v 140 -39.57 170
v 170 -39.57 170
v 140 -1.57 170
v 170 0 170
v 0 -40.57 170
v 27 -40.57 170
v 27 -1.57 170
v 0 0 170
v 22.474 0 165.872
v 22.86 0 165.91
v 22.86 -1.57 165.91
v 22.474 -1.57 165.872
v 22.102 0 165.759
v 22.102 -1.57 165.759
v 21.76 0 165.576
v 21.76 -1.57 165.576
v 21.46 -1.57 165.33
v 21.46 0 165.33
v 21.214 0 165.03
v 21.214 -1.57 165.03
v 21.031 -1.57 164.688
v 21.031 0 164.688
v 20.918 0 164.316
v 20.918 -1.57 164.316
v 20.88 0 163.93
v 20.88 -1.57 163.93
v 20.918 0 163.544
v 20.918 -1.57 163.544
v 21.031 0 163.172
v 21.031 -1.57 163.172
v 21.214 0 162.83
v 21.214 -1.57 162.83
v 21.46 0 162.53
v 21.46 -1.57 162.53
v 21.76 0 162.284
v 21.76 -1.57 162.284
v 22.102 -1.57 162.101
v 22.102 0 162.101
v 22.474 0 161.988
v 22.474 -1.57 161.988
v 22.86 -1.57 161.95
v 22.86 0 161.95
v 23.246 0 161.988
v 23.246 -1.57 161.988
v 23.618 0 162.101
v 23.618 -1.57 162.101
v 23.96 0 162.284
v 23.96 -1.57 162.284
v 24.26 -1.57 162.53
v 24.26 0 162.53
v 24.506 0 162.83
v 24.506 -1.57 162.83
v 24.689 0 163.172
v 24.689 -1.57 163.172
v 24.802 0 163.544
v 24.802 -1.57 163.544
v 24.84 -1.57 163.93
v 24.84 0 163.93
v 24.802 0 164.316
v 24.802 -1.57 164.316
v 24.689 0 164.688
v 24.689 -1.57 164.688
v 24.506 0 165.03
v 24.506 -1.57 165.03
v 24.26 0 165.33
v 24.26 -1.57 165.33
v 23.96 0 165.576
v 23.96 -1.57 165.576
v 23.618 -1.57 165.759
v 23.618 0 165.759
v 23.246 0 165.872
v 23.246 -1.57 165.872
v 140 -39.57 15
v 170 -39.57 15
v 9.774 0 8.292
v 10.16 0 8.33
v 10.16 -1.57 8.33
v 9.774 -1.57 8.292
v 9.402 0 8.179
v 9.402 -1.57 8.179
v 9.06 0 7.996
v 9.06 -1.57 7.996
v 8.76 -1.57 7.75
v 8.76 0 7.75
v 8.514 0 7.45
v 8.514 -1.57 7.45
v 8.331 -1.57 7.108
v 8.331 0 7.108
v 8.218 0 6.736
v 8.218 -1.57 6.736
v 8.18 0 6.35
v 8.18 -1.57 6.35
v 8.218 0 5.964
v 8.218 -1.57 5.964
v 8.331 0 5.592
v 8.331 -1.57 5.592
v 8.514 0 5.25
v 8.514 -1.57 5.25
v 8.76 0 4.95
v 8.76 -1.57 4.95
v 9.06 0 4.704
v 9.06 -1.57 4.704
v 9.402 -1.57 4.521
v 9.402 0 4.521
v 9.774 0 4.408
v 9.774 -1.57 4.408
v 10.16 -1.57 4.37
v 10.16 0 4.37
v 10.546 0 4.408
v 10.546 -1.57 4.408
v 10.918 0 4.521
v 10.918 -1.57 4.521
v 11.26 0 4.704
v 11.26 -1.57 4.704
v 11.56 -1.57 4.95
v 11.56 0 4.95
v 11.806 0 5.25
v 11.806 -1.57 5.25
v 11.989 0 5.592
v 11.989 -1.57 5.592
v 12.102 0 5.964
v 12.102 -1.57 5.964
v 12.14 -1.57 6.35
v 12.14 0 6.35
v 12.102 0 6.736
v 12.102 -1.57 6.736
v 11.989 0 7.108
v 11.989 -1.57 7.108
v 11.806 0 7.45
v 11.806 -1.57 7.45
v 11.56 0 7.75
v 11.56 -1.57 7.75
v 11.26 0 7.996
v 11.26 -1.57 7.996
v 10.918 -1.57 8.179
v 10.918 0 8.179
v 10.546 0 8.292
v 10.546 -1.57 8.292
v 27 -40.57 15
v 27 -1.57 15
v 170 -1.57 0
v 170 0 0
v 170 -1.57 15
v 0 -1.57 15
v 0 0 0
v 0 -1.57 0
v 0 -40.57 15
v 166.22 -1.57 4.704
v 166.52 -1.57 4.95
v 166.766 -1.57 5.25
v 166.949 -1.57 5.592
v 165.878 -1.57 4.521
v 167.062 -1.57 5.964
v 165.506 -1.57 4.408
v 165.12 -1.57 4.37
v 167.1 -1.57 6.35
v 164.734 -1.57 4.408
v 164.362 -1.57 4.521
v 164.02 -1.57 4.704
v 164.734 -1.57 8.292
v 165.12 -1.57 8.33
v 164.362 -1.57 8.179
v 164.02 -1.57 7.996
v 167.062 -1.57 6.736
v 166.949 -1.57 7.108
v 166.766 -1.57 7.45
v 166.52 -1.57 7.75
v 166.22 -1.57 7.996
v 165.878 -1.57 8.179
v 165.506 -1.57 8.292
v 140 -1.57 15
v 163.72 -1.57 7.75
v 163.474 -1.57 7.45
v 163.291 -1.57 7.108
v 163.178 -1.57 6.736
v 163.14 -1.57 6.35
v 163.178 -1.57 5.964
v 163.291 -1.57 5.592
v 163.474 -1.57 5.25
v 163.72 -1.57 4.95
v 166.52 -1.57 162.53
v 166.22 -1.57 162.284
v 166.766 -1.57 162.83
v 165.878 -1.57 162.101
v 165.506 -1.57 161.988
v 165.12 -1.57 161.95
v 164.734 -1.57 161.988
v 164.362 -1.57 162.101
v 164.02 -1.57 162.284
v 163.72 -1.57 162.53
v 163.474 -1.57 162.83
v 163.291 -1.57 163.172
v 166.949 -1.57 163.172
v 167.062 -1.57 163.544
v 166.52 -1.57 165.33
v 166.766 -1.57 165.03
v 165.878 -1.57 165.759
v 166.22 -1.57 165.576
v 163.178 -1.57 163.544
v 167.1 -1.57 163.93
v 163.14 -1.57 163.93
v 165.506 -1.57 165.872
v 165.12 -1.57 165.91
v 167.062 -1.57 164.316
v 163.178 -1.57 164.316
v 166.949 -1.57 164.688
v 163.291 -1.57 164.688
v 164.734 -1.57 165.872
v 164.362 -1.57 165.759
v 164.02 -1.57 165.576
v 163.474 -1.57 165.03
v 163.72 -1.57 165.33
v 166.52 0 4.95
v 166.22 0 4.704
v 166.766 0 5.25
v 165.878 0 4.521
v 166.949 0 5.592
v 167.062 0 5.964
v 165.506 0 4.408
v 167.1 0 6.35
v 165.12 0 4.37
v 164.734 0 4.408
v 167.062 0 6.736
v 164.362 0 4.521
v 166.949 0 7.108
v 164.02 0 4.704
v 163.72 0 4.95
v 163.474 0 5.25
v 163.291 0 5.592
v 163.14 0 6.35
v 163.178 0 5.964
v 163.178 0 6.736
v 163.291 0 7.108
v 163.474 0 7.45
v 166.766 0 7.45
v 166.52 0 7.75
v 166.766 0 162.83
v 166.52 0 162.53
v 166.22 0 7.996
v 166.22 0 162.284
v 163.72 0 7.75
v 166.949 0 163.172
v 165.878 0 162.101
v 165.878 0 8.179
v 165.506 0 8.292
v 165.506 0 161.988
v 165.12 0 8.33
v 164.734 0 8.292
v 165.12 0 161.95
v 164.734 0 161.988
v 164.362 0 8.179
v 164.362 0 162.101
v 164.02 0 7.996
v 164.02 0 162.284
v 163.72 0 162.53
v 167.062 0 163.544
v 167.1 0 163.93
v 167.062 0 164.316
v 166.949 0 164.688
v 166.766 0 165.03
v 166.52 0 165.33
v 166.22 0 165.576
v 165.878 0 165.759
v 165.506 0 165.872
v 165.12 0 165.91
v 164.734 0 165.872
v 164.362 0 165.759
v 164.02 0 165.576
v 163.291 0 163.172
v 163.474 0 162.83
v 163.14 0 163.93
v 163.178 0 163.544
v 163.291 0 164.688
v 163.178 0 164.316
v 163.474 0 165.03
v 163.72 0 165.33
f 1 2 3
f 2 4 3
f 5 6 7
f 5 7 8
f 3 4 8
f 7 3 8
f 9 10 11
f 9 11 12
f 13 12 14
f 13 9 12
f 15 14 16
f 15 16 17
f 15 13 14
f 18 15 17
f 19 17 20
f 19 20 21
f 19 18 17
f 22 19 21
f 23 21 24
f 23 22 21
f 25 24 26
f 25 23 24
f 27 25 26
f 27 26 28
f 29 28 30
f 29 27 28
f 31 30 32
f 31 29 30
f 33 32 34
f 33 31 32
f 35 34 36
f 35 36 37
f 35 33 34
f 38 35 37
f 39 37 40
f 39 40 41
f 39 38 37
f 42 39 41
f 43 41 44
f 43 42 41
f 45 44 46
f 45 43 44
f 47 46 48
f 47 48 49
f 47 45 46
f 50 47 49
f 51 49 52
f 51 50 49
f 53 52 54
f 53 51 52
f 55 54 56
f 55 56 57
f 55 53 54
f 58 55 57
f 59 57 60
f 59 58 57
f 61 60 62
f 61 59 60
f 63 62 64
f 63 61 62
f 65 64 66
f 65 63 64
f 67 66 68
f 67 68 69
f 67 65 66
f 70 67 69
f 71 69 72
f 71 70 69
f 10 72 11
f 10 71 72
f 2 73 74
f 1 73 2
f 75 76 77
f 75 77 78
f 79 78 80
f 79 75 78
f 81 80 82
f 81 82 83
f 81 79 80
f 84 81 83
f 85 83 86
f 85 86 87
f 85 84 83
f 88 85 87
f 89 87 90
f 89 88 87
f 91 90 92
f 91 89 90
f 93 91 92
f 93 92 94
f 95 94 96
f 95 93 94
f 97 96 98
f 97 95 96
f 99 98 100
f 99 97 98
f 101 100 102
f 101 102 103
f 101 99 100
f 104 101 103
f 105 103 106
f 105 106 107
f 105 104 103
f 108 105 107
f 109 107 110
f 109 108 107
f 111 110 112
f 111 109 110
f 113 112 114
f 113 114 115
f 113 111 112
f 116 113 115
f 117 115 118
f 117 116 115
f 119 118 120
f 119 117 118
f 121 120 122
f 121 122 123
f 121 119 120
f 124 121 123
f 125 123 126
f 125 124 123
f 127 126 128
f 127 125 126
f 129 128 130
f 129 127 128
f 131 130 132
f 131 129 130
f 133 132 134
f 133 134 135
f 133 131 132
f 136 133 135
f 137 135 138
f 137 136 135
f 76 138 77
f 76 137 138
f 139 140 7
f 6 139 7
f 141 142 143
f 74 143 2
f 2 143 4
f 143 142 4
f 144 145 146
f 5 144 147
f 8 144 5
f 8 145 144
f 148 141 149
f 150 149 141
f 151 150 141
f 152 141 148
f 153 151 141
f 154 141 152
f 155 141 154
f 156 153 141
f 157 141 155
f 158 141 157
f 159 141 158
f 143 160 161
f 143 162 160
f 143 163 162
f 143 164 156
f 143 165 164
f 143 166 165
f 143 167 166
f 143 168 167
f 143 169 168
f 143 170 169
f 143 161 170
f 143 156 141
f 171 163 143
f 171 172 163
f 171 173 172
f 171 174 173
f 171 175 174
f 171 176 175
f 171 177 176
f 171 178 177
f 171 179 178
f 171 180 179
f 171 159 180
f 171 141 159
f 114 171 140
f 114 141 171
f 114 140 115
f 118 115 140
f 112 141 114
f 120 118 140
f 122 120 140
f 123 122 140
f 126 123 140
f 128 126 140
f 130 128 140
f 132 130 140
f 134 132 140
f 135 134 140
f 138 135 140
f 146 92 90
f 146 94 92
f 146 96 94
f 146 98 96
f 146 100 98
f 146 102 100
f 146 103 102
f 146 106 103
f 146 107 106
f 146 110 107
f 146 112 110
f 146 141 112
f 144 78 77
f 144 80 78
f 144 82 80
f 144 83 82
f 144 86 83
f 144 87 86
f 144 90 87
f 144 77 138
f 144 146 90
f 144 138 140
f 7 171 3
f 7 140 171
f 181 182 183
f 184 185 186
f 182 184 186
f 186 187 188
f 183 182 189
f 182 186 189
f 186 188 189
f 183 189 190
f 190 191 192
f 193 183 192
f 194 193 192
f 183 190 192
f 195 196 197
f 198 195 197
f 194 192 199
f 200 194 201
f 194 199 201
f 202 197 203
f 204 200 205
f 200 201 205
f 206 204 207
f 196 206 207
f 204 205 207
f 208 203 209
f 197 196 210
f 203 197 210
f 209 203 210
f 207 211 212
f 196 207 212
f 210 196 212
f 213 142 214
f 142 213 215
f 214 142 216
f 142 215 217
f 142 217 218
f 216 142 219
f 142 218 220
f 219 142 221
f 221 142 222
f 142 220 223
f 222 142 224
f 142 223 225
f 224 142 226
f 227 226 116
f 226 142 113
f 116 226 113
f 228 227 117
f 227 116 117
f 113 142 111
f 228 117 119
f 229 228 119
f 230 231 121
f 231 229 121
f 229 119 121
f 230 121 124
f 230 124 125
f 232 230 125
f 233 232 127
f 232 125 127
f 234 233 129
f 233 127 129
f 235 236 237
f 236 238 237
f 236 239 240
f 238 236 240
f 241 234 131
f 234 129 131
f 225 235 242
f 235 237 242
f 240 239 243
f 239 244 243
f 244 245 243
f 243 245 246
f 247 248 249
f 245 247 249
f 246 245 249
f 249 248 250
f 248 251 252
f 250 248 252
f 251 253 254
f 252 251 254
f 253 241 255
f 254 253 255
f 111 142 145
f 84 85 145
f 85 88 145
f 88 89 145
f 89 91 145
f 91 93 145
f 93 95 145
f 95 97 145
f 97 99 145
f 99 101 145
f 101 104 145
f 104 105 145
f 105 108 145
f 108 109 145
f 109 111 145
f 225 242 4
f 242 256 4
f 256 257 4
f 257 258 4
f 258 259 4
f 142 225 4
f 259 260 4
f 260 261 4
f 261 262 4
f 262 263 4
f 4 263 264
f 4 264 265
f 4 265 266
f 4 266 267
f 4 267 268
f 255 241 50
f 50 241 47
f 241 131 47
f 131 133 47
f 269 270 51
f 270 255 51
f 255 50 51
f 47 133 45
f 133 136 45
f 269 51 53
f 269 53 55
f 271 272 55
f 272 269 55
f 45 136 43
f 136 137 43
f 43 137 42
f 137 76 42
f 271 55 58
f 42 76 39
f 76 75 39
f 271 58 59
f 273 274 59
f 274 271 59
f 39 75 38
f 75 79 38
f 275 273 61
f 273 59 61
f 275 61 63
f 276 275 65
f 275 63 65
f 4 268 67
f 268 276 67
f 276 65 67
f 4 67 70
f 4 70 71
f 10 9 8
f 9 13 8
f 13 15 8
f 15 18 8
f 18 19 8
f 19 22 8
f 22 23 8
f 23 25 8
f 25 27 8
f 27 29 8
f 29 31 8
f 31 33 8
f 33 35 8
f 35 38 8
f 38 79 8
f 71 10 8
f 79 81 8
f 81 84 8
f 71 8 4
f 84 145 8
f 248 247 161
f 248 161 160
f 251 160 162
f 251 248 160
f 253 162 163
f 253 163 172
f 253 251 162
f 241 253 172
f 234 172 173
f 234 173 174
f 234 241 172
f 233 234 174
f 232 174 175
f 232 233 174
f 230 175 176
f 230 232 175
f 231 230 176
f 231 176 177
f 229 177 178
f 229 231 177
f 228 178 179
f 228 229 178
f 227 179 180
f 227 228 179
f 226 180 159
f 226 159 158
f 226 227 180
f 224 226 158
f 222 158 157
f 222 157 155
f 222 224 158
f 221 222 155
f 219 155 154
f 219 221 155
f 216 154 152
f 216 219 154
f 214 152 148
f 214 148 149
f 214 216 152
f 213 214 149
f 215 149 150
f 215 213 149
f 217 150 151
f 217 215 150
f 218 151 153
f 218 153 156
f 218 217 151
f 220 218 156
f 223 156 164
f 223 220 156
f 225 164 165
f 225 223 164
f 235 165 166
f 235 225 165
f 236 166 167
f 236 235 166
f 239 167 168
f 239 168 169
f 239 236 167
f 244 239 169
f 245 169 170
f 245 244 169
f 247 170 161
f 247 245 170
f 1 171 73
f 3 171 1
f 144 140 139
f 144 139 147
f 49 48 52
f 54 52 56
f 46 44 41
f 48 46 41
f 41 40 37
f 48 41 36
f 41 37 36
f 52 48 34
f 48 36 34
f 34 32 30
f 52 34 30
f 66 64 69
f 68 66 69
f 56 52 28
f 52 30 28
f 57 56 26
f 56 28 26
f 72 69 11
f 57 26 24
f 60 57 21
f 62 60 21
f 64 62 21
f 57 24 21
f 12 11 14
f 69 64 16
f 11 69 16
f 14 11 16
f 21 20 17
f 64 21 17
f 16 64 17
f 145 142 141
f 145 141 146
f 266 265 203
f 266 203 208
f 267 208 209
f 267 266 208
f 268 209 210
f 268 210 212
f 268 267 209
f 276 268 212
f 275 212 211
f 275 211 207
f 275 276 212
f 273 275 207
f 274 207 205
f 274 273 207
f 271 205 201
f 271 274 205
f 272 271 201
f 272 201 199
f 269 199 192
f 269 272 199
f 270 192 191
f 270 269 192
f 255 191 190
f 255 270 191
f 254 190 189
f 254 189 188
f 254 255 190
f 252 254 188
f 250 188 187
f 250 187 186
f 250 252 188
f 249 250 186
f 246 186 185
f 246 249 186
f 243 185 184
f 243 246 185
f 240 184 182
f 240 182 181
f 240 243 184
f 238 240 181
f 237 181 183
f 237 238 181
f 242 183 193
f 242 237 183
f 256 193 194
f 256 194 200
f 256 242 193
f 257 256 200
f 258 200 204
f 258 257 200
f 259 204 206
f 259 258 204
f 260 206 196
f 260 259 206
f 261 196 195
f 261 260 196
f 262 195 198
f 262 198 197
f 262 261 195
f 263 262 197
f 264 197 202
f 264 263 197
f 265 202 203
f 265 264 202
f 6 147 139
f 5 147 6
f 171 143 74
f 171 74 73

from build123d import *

# Parameters (mm, degrees)
F0_W     = 170
F0_H     = 170
F0_R     = 1.98
F1_DEPTH = 1.57
F2_W     = 155
F2_H     = 27
F3_DEPTH = 39
F4_W     = 155
F4_H     = 30
F5_DEPTH = 38
F6_ANGLE = -90


with BuildPart() as f1:
    # F0 (on Front) → F1 (new body)
    with BuildSketch(Plane.XZ):
        with Locations((85, 85)):
            Rectangle(F0_W, F0_H)
        with Locations((6.35, 4.88)):
            Circle(F0_R, mode=Mode.SUBTRACT)
        with Locations((163.93, 4.88)):
            Circle(F0_R, mode=Mode.SUBTRACT)
        with Locations((6.35, 159.84)):
            Circle(F0_R, mode=Mode.SUBTRACT)
        with Locations((163.93, 147.14)):
            Circle(F0_R, mode=Mode.SUBTRACT)
    extrude(amount=F1_DEPTH)

    # F2 (on face) → F3 (join)
    with BuildSketch(Plane.XZ.offset(1.57)):
        with Locations((92.5, 156.5)):
            Rectangle(F2_W, F2_H)
    extrude(amount=F3_DEPTH)

    # F4 (on face) → F5 (join)
    with BuildSketch(Plane.XZ.offset(1.57)):
        with Locations((92.5, 15)):
            Rectangle(F4_W, F4_H)
    extrude(amount=F5_DEPTH)


with BuildPart() as f1_1:
    # F6: moved
    add(f1.part.rotate(Axis((0, -0.785, 0), (0, 1, 0)), F6_ANGLE))


with BuildPart() as f1_2:
    # F7: moved
    add(f1_1.part.moved(Location((170, 0, 0))))


solid = f1_2.part
